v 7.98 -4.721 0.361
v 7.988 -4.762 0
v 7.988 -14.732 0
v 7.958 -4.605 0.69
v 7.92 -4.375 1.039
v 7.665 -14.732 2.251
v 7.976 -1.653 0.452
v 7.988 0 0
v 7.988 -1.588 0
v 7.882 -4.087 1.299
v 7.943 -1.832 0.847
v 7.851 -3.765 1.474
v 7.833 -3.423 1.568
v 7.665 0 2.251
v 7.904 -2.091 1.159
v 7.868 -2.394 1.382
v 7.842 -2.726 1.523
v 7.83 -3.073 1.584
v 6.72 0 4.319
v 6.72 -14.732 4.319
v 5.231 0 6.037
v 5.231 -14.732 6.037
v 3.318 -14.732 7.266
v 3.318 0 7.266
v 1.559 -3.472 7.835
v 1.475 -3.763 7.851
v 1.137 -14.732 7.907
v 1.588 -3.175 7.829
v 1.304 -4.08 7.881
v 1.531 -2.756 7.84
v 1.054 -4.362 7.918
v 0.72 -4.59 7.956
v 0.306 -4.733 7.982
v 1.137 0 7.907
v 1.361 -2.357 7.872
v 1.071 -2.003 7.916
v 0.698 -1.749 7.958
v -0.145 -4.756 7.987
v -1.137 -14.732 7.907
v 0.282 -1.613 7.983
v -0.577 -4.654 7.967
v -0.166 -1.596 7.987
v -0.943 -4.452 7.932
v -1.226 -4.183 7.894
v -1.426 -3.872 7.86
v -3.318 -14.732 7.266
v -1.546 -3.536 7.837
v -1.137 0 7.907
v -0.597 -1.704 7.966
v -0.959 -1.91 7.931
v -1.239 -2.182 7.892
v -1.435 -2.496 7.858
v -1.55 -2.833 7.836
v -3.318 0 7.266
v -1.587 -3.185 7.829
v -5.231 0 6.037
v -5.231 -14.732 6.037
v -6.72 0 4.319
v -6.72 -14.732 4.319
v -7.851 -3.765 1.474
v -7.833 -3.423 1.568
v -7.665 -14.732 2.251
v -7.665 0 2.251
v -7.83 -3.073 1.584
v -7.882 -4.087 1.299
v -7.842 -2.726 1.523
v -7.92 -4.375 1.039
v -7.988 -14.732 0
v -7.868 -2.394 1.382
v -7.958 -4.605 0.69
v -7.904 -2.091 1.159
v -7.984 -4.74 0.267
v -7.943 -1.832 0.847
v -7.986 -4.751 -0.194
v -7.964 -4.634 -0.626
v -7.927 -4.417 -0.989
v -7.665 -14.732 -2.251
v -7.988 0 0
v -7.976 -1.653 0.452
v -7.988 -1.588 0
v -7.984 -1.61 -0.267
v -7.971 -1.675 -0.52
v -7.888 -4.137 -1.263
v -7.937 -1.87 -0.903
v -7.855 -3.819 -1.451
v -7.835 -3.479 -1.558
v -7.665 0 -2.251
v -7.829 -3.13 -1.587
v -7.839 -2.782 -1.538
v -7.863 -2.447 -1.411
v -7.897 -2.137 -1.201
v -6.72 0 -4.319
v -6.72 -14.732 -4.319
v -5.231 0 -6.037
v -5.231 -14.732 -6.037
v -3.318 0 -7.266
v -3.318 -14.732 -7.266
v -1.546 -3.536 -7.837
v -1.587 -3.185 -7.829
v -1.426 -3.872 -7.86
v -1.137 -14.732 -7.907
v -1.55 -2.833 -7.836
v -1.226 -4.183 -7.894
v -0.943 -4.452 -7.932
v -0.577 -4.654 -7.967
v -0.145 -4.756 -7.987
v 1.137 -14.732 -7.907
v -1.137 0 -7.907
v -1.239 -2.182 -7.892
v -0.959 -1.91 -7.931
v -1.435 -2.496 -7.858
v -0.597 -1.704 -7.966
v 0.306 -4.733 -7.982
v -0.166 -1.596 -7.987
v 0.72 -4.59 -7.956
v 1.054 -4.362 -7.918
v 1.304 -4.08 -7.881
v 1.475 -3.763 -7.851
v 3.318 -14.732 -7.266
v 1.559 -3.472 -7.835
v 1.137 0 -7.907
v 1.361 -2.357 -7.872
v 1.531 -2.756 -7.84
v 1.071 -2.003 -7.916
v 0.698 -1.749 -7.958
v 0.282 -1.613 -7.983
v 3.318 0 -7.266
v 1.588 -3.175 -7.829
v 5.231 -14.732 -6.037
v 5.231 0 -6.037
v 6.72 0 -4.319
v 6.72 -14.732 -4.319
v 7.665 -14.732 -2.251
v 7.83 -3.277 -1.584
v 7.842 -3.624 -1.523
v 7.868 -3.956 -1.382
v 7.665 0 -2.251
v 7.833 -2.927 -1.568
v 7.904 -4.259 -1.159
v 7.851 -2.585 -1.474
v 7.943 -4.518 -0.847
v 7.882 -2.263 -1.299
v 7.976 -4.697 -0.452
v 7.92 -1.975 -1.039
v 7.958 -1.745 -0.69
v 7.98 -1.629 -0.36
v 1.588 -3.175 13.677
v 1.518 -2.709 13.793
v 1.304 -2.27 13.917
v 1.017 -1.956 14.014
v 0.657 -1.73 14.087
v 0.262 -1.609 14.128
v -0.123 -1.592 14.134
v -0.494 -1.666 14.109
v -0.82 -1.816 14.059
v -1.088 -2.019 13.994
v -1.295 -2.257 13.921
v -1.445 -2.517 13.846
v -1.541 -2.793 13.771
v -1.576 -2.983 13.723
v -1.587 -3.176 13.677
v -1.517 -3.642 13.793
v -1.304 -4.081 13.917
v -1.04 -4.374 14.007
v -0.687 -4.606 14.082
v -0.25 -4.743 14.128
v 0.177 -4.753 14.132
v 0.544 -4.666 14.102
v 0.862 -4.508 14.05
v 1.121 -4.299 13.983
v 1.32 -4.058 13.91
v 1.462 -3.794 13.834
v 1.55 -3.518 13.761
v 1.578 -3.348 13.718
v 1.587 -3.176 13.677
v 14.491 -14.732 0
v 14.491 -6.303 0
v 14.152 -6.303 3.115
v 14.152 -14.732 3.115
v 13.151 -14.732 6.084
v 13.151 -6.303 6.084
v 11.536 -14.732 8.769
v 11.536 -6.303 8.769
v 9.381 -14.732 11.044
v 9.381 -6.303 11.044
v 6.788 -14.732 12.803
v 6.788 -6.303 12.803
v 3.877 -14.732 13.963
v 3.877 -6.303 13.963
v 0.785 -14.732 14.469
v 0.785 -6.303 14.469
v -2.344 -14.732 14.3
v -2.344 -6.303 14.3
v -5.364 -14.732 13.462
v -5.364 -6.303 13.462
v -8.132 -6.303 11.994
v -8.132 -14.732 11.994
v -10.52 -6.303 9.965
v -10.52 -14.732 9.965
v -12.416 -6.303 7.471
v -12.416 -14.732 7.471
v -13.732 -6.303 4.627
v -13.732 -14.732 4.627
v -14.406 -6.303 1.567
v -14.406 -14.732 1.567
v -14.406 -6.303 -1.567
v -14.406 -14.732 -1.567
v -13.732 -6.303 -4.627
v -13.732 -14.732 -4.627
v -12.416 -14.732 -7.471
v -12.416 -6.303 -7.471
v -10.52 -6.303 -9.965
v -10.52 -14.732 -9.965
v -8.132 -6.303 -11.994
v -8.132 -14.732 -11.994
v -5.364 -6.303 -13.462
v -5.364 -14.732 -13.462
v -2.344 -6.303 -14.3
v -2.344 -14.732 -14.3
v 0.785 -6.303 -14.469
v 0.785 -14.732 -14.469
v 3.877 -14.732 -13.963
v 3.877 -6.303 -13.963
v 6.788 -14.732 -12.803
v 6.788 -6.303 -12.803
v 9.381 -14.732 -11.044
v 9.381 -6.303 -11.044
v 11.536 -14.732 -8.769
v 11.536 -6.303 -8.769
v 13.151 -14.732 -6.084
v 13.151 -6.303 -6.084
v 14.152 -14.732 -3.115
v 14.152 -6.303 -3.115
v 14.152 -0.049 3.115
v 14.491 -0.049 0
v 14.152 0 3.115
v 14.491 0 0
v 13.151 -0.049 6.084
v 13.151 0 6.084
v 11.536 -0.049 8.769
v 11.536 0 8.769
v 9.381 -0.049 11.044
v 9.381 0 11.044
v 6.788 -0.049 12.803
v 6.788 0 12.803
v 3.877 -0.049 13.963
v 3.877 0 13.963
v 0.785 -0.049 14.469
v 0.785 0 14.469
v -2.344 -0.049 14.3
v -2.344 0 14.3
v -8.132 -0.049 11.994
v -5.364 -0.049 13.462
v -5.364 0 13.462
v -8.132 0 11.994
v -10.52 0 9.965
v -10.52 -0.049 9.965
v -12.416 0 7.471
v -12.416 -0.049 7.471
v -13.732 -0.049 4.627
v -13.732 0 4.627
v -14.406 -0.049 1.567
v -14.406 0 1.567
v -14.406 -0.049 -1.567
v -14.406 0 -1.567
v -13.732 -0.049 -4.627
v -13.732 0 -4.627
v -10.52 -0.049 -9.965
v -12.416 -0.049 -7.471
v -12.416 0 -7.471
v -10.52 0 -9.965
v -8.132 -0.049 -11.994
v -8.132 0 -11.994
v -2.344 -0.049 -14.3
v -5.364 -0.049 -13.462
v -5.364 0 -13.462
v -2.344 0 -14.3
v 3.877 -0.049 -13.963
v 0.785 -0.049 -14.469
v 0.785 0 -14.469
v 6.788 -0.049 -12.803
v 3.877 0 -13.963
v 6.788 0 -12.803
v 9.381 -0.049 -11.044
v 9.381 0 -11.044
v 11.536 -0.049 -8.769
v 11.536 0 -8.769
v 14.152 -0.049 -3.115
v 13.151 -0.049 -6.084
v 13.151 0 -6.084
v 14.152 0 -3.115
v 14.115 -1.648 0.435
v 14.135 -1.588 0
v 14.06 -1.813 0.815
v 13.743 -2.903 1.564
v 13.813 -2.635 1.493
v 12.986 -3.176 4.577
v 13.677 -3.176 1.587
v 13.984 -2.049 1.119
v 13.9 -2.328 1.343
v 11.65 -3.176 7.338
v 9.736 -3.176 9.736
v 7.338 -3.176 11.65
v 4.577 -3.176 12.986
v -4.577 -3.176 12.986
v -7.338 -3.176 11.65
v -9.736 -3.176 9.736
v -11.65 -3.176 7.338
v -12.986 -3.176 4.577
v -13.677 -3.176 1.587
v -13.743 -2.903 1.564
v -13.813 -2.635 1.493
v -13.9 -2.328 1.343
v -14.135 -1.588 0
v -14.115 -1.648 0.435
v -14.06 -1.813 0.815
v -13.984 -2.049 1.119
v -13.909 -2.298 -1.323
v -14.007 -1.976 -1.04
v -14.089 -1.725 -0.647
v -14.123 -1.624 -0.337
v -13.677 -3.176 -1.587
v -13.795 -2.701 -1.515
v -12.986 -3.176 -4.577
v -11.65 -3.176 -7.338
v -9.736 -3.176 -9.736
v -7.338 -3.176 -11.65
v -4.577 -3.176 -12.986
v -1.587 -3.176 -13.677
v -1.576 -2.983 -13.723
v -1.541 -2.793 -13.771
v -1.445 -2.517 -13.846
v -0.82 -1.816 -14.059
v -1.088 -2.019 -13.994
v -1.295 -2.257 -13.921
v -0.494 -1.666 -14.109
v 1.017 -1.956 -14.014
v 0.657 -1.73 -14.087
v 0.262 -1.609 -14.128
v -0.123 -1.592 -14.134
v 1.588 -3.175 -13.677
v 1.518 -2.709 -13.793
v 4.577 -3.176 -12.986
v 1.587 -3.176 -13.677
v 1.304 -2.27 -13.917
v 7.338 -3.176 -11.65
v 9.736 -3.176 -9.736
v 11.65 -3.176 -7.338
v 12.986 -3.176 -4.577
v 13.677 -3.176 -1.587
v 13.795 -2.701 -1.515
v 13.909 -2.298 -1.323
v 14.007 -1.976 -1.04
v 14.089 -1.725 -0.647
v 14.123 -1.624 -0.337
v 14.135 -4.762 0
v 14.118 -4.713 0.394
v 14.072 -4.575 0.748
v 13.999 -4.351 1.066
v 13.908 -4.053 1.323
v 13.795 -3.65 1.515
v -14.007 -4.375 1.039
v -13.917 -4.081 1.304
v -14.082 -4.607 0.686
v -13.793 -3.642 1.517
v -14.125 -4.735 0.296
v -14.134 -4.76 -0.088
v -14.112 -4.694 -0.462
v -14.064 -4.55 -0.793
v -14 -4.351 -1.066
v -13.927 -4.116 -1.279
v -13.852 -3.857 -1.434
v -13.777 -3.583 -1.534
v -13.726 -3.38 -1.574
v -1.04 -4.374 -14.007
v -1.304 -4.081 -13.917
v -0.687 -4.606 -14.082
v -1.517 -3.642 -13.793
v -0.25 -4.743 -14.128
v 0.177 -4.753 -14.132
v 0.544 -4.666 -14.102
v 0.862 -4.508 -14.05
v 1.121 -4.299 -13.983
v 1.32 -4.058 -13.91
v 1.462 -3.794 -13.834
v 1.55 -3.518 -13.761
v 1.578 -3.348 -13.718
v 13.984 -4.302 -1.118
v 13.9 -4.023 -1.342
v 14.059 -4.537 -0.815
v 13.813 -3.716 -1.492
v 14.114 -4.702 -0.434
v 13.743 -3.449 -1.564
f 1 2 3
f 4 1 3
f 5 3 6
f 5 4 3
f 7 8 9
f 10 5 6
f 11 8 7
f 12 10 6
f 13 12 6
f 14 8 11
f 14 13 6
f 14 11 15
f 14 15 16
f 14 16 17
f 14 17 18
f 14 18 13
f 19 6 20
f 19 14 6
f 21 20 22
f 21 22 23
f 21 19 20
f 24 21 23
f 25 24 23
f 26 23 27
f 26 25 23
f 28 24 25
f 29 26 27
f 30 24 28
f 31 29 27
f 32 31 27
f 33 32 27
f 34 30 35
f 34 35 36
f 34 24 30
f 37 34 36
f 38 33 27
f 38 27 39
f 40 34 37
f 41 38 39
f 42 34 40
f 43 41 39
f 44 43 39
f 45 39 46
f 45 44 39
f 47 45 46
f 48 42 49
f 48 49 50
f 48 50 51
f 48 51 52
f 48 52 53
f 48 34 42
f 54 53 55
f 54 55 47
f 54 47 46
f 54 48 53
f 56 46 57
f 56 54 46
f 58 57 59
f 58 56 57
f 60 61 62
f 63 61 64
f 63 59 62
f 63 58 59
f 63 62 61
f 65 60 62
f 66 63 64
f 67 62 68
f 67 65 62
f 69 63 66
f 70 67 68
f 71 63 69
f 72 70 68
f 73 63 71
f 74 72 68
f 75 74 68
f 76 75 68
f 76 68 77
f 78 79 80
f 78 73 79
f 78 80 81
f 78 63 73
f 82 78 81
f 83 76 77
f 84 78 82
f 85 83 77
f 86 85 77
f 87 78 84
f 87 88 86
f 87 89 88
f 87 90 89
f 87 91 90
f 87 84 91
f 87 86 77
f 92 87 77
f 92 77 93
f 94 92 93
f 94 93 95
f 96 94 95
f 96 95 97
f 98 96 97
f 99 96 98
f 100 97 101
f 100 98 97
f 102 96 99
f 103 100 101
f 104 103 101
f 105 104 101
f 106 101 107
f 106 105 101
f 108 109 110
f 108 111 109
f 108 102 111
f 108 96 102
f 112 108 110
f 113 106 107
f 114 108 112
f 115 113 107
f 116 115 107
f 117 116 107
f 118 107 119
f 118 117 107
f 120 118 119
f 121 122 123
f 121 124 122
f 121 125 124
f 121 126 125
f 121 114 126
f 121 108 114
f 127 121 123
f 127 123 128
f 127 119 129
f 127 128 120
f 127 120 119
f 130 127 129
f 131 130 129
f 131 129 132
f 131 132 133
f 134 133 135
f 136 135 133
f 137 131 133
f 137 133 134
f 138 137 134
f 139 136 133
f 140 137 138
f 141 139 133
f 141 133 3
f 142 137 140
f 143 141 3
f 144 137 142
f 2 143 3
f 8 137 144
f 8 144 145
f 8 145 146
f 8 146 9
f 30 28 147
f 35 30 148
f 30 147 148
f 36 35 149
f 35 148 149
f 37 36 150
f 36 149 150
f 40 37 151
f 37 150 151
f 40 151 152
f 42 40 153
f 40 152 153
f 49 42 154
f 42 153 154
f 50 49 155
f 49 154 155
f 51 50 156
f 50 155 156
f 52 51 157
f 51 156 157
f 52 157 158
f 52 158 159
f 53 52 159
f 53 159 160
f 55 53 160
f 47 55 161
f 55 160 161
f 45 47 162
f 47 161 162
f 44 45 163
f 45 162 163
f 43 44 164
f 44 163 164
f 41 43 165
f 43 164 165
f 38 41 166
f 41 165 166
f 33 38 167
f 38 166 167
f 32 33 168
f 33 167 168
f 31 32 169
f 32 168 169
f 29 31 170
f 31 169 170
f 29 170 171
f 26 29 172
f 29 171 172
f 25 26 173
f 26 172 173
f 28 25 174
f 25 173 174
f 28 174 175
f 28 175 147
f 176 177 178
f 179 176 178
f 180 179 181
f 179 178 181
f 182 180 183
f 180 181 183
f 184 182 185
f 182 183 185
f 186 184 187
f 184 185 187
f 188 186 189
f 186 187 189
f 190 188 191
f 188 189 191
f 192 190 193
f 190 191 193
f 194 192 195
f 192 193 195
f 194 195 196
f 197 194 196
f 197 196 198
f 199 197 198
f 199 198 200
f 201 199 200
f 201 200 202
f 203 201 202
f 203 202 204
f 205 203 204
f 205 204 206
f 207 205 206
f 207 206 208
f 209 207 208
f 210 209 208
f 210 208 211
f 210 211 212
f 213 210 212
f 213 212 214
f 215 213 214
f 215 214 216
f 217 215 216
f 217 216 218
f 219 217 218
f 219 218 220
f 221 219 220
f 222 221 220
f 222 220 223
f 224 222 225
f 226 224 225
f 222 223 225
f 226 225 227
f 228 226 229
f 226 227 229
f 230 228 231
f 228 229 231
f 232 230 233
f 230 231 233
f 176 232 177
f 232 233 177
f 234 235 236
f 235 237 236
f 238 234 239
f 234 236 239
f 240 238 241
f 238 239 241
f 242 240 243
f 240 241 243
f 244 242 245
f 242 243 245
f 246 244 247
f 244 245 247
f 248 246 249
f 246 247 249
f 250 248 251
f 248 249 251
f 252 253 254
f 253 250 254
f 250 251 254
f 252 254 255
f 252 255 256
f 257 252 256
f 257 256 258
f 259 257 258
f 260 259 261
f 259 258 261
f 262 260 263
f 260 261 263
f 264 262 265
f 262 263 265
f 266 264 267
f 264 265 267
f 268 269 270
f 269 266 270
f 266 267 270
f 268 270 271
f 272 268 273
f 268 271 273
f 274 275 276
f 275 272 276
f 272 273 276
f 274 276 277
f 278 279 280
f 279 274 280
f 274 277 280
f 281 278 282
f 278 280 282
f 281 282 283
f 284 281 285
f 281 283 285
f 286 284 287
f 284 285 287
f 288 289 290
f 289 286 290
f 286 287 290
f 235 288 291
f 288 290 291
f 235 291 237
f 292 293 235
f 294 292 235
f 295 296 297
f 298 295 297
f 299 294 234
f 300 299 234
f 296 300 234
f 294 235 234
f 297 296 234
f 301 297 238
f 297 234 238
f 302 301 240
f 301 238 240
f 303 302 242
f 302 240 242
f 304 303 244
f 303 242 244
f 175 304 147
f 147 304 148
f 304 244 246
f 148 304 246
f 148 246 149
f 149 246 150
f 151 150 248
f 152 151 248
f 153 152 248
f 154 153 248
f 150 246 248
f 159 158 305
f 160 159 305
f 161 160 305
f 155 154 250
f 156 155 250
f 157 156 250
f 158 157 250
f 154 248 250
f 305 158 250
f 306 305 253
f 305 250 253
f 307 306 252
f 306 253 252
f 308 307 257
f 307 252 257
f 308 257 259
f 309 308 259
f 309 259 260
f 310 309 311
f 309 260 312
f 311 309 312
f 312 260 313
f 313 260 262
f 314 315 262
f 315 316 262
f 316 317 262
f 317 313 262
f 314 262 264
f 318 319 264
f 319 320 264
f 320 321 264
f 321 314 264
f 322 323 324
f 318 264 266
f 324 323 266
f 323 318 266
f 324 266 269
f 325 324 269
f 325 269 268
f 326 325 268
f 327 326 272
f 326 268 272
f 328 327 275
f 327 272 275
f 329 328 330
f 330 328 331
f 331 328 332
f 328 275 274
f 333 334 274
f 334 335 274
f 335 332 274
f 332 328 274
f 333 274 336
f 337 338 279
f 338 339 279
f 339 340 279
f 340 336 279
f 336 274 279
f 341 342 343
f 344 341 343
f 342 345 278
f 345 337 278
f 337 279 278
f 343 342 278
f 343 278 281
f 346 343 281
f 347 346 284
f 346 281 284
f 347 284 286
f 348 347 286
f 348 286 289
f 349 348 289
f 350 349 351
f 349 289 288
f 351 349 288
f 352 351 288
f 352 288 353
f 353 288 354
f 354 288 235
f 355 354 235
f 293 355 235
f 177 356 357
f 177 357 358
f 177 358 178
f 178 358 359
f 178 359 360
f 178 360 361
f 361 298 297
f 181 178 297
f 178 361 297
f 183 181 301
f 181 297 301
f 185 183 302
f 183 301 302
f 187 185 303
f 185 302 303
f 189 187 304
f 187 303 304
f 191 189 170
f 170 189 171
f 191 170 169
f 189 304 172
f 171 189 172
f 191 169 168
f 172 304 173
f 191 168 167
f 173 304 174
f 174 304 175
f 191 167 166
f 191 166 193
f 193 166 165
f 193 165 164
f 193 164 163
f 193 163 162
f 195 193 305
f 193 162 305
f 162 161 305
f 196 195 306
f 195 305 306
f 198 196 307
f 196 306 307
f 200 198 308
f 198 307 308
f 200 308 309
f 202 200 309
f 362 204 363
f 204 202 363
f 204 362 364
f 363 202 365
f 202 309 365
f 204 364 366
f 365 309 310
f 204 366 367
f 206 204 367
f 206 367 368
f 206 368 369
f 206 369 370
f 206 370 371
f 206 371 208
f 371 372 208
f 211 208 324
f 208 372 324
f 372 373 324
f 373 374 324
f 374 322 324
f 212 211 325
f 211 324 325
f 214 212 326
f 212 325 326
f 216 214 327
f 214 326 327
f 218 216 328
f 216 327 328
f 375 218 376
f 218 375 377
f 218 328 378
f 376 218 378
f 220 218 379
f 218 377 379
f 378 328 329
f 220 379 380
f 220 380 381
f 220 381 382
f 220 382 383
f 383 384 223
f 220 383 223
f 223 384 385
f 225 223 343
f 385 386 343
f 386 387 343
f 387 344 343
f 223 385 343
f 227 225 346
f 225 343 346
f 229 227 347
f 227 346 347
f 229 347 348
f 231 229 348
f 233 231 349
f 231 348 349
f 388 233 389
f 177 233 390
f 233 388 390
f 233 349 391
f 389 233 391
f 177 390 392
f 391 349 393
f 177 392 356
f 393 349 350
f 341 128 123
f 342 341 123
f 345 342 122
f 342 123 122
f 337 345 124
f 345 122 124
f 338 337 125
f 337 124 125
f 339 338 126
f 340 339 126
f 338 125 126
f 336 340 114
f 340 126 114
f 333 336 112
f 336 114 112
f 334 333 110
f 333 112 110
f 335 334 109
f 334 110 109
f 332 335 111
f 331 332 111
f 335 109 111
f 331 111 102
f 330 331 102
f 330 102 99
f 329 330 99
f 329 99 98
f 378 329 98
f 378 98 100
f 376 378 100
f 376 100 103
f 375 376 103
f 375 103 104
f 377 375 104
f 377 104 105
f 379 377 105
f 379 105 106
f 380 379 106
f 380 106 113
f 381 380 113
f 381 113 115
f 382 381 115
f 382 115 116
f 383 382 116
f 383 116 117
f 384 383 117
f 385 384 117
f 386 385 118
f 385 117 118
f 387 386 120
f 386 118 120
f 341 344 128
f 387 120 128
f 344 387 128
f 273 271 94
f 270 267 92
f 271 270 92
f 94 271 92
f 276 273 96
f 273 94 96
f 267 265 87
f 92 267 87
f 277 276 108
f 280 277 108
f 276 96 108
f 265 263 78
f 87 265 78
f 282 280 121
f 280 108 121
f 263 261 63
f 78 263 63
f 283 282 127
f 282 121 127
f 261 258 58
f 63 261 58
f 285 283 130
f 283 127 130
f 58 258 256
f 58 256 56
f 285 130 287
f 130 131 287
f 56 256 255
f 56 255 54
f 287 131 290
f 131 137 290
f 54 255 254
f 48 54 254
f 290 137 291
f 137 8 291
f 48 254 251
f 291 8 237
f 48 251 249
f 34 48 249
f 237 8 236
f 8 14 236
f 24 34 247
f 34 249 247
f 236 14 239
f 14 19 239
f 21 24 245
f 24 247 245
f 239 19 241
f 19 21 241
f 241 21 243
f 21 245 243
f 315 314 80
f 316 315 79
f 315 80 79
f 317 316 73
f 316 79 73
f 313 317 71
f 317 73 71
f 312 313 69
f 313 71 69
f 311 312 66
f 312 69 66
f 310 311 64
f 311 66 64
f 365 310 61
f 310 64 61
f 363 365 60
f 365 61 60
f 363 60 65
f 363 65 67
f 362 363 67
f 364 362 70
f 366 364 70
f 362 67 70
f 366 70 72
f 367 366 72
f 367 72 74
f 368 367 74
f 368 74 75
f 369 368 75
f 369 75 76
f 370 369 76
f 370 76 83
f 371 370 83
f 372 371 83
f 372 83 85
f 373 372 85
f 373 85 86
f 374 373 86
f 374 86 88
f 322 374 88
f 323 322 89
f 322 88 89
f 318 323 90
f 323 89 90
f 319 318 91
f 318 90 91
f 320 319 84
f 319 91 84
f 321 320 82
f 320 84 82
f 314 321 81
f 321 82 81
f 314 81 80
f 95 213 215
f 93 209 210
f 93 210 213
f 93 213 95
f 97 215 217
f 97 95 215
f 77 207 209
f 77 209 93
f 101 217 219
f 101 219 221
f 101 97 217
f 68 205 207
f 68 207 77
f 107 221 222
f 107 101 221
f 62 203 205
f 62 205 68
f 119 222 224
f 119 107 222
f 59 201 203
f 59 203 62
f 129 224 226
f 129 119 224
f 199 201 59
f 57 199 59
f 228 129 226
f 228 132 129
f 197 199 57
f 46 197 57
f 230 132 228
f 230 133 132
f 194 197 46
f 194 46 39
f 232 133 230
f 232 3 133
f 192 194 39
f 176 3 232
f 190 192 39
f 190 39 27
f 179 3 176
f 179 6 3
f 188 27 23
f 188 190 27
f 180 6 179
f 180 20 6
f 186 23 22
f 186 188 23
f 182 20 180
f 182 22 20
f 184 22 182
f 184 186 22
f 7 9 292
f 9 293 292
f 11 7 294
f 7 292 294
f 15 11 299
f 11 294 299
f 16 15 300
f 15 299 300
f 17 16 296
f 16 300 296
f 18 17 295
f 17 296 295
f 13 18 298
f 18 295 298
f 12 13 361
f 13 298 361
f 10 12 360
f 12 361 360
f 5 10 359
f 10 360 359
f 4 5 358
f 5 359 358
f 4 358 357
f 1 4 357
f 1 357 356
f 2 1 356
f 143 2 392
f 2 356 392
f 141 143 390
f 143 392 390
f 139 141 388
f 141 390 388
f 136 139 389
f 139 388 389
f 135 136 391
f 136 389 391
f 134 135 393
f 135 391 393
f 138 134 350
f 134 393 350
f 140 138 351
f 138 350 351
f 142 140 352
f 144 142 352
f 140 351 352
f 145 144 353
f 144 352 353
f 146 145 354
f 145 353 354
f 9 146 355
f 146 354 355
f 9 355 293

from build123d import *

# Parameters (mm, degrees)
F0_R     = 14.4907
F0_R_2   = 7.9883
F1_DEPTH = 6.35
F2_R     = 14.4907
F2_R_2   = 7.9883
F3_DEPTH = 8.382
F4_R     = 1.5875
F5_DEPTH = 15.1638
F6_R     = 1.5875
F7_DEPTH = 15.4178


with BuildPart() as f1:
    # F0 (on Front) → F1 (new body)
    with BuildSketch(Plane.XZ):
        Circle(F0_R)
        Circle(F0_R_2, mode=Mode.SUBTRACT)
    extrude(amount=F1_DEPTH)

    # F2 (on face) → F3 (join)
    with BuildSketch(Plane.XZ.offset(6.35)):
        Circle(F2_R)
        Circle(F2_R_2, mode=Mode.SUBTRACT)
    extrude(amount=F3_DEPTH)

    # F4 (on Right) → F5 (cut, symmetric)
    with BuildSketch(Plane.YZ):
        with Locations((-3.175, 0)):
            Circle(F4_R)
    extrude(amount=F5_DEPTH, both=True, mode=Mode.SUBTRACT)

    # F6 (on Top) → F7 (cut, symmetric)
    with BuildSketch(Plane.XY):
        with Locations((0, -3.175)):
            Circle(F6_R)
    extrude(amount=F7_DEPTH, both=True, mode=Mode.SUBTRACT)

    # F9: sweep along a path in F0
    with BuildLine(Plane.XZ) as f9_path:
        CenterArc((0, 0), 14.4907, 0, 360)
    # F8 (on Right) → F9 (sweep, cut)
    with BuildSketch(Plane.YZ):
        Polygon((0, 14.501917), (0, 16.049927), (-6.35176, 16.049927), (-6.35176, 14.501917), (-3.17588, 13.768708), align=None)
    sweep(path=f9_path.line, mode=Mode.SUBTRACT)


solid = f1.part
